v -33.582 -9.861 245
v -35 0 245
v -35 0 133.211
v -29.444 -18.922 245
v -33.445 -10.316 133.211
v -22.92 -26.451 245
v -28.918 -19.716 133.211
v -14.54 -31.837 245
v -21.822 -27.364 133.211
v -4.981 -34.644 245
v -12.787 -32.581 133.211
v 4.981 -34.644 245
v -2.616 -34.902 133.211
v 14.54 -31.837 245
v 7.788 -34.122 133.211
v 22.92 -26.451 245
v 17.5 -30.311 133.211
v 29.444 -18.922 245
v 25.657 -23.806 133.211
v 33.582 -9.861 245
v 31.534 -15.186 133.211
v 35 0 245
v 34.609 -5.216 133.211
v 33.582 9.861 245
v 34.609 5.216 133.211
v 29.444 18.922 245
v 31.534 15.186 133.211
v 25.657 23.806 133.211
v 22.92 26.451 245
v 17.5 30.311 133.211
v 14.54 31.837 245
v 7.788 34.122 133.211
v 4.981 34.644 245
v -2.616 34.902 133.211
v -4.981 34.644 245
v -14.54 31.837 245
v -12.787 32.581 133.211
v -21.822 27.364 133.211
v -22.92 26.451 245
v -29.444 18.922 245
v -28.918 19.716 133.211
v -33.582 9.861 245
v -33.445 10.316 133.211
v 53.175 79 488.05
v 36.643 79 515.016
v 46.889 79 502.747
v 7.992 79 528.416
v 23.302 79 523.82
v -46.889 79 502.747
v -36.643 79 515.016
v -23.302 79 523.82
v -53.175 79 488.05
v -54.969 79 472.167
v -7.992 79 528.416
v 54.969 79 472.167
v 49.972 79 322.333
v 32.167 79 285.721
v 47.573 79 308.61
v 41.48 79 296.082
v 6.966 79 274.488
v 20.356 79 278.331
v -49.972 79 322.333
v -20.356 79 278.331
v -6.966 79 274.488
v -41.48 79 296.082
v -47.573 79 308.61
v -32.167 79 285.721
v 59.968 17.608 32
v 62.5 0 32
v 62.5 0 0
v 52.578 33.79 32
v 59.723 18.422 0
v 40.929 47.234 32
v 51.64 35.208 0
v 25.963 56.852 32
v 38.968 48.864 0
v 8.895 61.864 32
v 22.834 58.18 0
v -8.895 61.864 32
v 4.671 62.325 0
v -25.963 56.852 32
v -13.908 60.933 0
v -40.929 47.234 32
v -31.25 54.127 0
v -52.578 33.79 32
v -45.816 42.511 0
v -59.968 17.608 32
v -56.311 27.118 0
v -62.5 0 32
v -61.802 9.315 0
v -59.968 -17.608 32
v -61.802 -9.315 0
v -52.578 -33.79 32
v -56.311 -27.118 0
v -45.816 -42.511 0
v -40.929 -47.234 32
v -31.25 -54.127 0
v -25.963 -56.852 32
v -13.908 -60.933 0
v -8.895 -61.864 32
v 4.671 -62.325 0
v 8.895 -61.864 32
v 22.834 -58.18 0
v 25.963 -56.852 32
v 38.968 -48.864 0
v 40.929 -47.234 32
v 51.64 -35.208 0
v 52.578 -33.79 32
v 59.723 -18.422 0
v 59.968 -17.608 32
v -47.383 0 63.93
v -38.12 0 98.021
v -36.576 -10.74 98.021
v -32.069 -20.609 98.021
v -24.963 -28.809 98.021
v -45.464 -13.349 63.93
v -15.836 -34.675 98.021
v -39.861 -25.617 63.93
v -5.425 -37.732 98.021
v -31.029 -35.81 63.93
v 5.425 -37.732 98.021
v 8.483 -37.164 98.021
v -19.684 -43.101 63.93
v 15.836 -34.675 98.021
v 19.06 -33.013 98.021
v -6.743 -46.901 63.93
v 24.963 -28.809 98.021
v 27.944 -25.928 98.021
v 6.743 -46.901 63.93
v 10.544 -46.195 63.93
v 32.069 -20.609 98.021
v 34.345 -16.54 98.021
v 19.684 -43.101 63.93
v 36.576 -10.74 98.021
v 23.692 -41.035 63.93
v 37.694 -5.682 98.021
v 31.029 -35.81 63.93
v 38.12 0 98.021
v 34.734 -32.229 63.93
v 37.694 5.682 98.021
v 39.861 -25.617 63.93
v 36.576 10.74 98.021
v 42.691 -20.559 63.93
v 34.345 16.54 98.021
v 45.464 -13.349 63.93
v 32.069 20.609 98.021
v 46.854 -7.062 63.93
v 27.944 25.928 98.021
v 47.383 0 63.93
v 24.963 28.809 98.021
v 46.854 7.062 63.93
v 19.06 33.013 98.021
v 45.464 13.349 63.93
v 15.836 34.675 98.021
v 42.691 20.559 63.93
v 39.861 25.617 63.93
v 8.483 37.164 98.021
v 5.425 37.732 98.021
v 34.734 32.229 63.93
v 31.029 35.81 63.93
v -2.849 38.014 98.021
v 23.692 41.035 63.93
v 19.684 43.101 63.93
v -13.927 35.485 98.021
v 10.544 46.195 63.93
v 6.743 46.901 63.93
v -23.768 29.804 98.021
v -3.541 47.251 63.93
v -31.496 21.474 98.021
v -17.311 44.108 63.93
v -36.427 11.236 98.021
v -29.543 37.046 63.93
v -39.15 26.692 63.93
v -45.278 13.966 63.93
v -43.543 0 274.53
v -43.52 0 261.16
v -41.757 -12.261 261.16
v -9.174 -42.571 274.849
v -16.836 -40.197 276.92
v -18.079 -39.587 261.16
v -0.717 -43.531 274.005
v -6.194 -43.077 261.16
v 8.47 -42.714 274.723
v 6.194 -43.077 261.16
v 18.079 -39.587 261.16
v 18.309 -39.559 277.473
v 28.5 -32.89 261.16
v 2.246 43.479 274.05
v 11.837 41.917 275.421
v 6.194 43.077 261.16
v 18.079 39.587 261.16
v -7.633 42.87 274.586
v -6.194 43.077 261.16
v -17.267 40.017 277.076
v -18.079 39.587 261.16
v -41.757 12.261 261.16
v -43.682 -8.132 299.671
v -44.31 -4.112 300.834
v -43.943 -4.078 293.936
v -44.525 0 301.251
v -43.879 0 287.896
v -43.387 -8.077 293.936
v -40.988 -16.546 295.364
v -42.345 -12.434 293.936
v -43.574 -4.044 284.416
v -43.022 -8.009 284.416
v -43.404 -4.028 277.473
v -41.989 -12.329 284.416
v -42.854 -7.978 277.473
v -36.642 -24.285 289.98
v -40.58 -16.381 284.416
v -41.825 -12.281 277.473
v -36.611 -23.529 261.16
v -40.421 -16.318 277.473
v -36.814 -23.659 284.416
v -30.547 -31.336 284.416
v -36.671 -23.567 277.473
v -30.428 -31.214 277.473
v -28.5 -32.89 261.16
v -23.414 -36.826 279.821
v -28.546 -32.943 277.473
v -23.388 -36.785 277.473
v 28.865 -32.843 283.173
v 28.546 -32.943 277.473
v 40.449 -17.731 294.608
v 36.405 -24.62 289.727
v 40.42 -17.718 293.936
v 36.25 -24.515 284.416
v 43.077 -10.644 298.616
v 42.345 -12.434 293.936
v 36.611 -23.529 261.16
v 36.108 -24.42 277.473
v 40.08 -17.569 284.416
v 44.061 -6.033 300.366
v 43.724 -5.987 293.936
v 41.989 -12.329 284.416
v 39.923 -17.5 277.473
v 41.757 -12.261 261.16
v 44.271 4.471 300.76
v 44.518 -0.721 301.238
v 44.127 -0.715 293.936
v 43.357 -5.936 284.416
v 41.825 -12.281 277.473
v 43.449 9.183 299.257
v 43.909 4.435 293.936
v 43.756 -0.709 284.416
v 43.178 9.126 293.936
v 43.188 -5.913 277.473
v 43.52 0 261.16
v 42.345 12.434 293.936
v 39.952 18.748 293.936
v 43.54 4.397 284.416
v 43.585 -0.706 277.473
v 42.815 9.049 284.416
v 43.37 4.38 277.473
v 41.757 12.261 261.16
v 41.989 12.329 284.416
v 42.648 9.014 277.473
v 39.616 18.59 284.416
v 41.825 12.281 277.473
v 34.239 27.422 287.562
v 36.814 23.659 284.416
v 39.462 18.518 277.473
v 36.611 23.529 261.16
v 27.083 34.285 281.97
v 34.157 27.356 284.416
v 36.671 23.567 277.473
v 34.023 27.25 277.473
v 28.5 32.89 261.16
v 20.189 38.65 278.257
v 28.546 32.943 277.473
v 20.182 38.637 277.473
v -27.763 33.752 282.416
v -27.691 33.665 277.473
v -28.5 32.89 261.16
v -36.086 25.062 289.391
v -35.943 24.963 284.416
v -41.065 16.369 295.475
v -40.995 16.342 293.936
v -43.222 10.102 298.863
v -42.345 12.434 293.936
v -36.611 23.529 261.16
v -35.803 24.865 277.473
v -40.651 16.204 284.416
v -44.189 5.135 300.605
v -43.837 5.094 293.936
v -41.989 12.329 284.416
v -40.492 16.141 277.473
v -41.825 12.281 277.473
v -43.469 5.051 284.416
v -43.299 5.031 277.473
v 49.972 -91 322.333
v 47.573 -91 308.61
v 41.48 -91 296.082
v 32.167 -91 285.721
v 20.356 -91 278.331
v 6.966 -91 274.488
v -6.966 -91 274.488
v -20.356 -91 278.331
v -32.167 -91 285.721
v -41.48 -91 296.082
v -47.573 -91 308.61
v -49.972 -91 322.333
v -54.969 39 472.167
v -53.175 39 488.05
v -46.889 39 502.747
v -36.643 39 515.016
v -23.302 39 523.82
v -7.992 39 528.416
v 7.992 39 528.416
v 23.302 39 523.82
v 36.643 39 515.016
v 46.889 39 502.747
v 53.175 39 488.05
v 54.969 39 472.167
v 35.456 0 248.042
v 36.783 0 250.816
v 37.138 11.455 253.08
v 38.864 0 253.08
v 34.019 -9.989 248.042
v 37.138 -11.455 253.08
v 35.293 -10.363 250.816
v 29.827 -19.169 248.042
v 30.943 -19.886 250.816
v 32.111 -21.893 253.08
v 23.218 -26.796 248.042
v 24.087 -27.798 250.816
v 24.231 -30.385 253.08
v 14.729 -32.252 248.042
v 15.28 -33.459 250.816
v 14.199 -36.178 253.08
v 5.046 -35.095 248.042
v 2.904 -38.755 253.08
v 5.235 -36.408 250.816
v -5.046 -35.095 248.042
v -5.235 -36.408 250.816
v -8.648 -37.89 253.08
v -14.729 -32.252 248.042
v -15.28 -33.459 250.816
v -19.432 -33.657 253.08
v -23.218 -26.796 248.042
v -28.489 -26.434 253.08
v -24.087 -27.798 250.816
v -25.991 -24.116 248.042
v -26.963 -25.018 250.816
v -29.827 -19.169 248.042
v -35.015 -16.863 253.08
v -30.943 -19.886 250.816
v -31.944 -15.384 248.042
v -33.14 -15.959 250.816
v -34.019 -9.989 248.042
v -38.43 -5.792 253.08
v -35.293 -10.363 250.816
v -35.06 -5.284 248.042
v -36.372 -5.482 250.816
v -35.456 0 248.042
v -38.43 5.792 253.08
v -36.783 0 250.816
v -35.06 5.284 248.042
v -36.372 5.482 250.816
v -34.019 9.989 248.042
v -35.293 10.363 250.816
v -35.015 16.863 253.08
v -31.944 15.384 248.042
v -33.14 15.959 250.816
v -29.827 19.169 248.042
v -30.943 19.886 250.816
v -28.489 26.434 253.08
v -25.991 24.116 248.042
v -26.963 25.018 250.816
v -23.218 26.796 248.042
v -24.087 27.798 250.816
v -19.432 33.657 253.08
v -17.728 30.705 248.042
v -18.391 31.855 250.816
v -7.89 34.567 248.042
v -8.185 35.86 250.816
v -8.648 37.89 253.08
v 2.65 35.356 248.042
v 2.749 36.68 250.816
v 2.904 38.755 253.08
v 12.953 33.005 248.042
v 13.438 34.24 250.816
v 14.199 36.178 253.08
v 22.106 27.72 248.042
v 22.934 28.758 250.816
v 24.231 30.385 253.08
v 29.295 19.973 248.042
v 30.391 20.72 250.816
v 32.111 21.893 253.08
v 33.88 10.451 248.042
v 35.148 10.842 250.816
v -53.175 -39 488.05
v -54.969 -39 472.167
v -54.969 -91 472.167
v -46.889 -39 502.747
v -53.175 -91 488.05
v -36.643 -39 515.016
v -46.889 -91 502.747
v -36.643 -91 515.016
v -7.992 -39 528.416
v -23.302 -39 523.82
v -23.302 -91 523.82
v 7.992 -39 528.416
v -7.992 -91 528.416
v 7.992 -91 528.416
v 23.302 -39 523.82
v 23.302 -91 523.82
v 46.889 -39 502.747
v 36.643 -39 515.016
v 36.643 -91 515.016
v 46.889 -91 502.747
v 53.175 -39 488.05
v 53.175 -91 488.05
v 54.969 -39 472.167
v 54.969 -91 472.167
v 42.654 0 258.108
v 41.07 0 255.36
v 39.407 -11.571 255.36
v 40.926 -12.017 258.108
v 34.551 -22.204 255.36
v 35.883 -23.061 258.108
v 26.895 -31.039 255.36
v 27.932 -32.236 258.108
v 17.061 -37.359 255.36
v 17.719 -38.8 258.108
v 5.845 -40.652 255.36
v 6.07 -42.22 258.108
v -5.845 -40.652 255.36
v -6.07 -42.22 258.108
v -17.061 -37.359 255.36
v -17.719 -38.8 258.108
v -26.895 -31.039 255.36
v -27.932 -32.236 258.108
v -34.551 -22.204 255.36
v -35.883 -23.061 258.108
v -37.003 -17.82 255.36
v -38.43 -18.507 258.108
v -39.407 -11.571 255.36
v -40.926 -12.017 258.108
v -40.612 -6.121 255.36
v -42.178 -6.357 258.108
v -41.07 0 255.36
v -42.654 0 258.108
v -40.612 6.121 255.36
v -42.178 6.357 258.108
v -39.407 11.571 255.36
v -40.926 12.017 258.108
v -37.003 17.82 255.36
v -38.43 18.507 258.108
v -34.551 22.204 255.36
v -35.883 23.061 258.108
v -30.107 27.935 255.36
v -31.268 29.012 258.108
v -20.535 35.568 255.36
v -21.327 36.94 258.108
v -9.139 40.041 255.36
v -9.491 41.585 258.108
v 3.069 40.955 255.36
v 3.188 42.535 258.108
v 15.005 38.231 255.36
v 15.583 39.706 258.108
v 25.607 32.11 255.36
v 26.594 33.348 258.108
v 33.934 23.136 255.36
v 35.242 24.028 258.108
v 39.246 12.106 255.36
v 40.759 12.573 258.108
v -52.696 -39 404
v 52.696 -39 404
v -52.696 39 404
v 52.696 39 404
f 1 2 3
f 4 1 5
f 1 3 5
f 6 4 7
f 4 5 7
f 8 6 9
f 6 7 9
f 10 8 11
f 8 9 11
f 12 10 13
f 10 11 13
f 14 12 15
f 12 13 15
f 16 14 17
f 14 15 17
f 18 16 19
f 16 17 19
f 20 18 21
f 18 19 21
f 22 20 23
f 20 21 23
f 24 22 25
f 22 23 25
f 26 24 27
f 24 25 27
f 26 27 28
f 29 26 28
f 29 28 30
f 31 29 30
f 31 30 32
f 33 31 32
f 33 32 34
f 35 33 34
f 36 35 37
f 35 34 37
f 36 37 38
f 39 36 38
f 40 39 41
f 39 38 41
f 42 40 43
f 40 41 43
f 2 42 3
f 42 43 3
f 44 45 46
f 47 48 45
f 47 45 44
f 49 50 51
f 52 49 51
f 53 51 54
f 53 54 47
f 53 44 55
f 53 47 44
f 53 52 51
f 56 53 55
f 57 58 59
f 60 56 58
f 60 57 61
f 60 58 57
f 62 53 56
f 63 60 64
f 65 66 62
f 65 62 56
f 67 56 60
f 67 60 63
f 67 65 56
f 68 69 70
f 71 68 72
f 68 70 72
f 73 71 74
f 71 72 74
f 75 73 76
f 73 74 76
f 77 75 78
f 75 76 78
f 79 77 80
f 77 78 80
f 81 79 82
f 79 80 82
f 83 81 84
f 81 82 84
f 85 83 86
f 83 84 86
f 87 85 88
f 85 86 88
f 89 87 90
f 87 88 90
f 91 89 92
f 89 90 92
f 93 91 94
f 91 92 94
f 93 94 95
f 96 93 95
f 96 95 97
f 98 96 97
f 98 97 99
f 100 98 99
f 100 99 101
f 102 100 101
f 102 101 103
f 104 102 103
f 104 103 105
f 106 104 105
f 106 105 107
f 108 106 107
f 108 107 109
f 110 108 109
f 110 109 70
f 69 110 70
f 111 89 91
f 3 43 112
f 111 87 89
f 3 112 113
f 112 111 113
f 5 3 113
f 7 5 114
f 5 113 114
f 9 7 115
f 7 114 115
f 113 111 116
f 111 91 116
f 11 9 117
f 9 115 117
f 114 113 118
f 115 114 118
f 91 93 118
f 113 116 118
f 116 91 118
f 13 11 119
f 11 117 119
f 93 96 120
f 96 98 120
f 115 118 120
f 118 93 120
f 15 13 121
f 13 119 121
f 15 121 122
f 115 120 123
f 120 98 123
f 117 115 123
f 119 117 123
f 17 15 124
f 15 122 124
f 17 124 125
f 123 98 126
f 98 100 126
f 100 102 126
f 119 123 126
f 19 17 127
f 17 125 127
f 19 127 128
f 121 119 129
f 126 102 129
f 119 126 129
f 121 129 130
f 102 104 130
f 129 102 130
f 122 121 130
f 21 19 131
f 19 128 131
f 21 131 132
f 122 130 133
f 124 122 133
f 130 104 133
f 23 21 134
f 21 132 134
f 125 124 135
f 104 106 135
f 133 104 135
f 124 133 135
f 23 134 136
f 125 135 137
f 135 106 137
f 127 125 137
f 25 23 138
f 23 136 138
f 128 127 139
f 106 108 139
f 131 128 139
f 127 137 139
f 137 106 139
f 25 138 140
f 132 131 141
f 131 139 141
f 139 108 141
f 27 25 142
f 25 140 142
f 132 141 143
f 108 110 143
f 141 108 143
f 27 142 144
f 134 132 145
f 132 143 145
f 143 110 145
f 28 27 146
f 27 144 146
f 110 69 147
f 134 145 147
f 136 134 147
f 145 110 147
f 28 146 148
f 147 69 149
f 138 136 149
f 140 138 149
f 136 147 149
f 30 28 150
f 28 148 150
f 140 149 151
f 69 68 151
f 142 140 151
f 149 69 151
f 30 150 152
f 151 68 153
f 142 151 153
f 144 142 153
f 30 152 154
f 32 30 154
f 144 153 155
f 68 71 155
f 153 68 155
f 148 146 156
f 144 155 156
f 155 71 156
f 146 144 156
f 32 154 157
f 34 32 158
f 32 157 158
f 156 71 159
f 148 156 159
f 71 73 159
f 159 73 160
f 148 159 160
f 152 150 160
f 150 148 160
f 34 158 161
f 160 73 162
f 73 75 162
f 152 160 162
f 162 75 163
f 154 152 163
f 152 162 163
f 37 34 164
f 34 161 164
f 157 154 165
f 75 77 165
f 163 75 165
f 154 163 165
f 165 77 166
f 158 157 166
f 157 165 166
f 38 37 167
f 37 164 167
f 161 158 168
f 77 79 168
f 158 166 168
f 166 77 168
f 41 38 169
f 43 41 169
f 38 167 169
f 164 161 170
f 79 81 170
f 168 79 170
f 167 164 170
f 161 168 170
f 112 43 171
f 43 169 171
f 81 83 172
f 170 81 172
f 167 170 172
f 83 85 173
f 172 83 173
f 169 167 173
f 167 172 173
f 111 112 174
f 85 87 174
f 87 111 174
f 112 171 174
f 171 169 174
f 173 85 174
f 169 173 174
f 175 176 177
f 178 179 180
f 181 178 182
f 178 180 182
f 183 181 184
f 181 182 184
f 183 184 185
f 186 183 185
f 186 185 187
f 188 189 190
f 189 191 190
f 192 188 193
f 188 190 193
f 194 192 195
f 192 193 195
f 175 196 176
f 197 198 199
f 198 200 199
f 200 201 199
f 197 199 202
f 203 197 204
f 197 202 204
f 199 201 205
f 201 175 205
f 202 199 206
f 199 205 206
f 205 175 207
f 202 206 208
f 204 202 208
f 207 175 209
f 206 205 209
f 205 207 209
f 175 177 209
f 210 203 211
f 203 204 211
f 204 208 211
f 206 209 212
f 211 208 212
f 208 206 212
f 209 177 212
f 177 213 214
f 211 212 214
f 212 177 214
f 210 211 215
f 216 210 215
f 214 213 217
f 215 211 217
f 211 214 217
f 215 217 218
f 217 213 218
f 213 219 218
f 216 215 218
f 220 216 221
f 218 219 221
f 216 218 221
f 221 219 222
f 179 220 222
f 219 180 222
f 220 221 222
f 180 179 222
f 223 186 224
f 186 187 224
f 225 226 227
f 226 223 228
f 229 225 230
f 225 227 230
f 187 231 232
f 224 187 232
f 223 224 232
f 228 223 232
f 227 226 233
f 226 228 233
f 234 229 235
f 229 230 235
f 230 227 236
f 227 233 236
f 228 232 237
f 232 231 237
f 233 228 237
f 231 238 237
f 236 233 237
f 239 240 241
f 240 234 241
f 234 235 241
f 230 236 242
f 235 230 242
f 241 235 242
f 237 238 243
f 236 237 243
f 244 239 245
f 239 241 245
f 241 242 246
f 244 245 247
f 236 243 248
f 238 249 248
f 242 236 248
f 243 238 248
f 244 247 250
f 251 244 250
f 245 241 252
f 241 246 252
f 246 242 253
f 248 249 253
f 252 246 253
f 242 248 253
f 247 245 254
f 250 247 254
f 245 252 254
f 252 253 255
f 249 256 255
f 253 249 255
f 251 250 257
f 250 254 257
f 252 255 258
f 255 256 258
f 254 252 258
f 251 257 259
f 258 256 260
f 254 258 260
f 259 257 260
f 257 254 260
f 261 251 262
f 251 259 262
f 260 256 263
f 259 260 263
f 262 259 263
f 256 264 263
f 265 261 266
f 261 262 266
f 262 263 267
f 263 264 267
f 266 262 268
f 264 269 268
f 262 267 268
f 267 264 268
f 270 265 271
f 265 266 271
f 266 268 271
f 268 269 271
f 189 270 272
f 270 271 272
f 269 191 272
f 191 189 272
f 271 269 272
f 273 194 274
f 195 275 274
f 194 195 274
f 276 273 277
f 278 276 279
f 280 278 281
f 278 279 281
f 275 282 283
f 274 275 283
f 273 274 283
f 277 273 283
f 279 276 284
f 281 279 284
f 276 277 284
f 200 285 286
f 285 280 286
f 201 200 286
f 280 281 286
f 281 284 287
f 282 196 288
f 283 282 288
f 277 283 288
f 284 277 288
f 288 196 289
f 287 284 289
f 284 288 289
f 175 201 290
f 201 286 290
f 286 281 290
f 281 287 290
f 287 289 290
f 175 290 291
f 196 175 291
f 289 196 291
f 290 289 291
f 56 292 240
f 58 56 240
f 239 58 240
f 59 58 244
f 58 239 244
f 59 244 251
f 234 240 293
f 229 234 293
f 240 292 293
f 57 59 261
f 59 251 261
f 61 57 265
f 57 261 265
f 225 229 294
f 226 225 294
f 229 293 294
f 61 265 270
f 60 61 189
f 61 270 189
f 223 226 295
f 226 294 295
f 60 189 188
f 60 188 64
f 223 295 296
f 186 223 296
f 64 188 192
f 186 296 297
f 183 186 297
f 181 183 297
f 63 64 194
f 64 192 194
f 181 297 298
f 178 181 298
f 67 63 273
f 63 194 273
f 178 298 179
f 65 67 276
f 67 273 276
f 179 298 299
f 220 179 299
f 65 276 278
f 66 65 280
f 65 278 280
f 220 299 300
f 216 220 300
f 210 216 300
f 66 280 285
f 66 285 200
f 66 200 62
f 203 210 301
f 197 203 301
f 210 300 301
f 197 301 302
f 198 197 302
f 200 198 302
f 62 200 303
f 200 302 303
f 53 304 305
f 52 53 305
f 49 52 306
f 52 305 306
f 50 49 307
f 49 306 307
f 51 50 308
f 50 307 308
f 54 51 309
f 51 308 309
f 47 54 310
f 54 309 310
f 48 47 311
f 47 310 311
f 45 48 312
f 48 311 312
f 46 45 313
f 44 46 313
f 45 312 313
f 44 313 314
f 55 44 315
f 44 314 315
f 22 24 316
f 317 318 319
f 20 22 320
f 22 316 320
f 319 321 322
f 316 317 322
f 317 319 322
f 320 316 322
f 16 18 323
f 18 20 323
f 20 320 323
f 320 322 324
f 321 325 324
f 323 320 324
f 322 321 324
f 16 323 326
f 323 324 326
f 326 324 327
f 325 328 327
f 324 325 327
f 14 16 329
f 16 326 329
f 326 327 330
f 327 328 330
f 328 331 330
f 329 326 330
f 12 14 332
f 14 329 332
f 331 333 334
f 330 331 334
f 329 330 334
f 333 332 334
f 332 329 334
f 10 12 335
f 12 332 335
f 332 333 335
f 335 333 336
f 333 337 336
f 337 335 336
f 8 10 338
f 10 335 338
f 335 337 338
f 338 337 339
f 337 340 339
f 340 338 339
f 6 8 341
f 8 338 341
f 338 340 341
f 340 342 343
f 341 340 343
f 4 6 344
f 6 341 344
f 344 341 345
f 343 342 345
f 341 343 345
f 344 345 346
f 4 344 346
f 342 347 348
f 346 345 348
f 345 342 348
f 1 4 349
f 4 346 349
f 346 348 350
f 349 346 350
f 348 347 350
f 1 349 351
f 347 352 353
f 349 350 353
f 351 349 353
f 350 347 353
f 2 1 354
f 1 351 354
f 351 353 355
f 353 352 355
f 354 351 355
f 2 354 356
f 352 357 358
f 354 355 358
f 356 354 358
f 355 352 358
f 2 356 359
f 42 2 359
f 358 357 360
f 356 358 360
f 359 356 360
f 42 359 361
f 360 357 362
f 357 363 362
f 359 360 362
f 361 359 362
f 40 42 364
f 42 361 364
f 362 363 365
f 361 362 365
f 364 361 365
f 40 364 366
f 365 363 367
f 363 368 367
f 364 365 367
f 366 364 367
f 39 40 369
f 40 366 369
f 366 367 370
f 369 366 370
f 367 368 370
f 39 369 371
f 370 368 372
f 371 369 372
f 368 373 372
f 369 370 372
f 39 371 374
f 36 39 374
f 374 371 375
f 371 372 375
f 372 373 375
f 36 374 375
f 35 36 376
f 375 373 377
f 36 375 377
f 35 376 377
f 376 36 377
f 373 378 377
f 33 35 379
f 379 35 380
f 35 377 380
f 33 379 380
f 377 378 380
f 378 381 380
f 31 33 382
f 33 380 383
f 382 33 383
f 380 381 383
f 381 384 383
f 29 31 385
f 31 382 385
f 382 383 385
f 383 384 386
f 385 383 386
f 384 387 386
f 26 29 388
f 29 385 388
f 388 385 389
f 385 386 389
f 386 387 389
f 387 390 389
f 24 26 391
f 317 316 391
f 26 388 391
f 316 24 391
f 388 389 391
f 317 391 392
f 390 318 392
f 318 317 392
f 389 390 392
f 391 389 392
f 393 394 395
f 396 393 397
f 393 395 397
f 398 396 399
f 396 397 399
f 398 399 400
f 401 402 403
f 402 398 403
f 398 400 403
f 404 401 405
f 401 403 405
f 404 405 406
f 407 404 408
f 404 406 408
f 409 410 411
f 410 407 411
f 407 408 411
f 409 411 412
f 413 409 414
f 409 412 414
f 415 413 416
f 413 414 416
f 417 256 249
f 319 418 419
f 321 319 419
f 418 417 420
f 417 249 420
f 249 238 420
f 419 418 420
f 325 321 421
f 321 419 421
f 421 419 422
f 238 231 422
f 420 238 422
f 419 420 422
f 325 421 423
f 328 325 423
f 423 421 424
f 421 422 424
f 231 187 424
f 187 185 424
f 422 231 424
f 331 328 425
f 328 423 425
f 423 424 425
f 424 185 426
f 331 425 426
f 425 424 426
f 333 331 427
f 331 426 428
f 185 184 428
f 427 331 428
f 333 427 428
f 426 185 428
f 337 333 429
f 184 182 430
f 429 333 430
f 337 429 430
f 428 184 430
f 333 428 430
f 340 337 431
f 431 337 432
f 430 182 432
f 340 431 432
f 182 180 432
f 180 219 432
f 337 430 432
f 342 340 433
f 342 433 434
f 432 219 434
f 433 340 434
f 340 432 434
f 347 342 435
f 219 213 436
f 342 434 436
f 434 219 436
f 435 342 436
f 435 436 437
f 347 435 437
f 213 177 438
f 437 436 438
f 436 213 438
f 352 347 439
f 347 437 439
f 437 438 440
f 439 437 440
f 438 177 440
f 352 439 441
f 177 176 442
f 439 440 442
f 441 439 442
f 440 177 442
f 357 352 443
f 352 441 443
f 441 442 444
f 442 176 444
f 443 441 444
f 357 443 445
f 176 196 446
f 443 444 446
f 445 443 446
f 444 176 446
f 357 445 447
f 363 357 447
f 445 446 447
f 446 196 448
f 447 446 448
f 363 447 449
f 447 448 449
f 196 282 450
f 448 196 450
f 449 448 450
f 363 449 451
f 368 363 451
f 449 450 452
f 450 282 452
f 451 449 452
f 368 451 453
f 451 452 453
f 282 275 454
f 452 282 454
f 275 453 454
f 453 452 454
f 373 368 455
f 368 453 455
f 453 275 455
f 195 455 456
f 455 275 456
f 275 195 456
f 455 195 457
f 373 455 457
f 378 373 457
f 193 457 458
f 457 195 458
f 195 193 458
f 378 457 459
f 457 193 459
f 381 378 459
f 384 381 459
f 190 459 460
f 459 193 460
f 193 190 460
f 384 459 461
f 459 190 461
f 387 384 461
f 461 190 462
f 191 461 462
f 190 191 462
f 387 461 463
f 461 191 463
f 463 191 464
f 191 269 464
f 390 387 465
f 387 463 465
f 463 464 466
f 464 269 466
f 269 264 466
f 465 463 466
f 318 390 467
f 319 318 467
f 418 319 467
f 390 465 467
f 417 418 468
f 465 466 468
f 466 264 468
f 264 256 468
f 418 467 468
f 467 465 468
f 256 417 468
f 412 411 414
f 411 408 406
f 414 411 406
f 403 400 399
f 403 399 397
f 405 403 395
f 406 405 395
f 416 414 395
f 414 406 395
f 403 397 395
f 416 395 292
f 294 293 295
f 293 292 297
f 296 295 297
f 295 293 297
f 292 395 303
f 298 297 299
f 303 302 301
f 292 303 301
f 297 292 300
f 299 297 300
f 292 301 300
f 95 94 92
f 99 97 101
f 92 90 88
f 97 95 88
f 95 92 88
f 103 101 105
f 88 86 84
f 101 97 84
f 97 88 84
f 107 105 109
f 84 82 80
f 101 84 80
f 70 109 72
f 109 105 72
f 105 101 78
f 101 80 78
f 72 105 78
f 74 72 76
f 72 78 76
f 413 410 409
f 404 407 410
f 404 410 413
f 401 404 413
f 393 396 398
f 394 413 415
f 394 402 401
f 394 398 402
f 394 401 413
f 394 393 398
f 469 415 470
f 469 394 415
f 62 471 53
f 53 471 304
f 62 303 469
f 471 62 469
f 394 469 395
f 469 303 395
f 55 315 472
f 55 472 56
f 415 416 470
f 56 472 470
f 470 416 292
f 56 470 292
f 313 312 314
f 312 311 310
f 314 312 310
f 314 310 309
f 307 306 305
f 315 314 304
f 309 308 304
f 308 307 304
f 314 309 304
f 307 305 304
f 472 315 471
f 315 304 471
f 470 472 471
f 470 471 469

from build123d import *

# Parameters (mm, degrees)
SKETCH_1_R               = 62.5
EXTRUDE_1_DEPTH          = 32
EXTRUDE_2_DEPTH          = 79
EXTRUDE_2_DEPTH_BACK     = 91
CUT_EXTRUDE_1_DEPTH      = 541.396382314
CUT_EXTRUDE_1_DEPTH_BACK = 541.396382314
SKETCH_12_W              = 78
SKETCH_12_H              = 125


with BuildPart() as part:
    # 草圖1 → 填料-伸長1 (new body)
    with BuildSketch(Plane.XY):
        Circle(SKETCH_1_R)
    extrude(amount=EXTRUDE_1_DEPTH)

    # 草圖3 → 旋轉1 (revolve)
    with BuildSketch(Plane(origin=(0, 0, 0), x_dir=(1, 0, 0), z_dir=(0, 1, 0)), mode=Mode.PRIVATE) as revolve_1_sk:
        with BuildLine():
            Line((0, -32), (0, -245))
            Line((0, -245), (35, -245))
            Line((35, -245), (35, -133.211))
            ThreePointArc((35, -133.211), (41.997410306, -80.770756577), (62.5, -32))
            Line((62.5, -32), (0, -32))
        make_face()
    revolve(revolve_1_sk.sketch.rotate(Axis((0, 0, 32), (0, 0, 1)), 180), axis=Axis((0, 0, 32), (0, 0, 1)))

    # 草圖6 → 旋轉2 (revolve)
    with BuildSketch(Plane(origin=(0, 0, 0), x_dir=(1, 0, 0), z_dir=(0, 1, 0))):
        with BuildLine():
            Line((0, -245), (35, -245))
            ThreePointArc((35, -245), (36.015734709, -249.478225638), (38.864145372, -253.08))
            ThreePointArc((38.864145372, -253.08), (41.946904934, -256.68505084), (43.52, -261.16))
            Line((43.52, -261.16), (0, -261.16))
            Line((0, -261.16), (0, -245))
        make_face()
    revolve(axis=Axis((0, 0, 211.16), (0, 0, -1)))

    # 草圖9 → 旋轉3 (revolve)
    with BuildSketch(Plane(origin=(0, 0, 0), x_dir=(1, 0, 0), z_dir=(0, 1, 0)), mode=Mode.PRIVATE) as revolve_3_sk:
        with BuildLine():
            Line((0, -261.16), (0, -322.34))
            Line((0, -322.34), (46.183269827, -322.34))
            ThreePointArc((46.183269827, -322.34), (44.034639015, -291.785565226), (43.52, -261.16))
            Line((43.52, -261.16), (0, -261.16))
        make_face()
    revolve(revolve_3_sk.sketch.rotate(Axis((0, 0, 0), (0, 0, 1)), 180), axis=Axis((0, 0, 0), (0, 0, 1)))

    # 草圖10 → 填料-伸長2 (add, two sides: drawn at the far end of the back side and taken through both)
    with BuildSketch(Plane(origin=(0, 0, 0), x_dir=(0, 0, -1), z_dir=(0, 1, 0)).offset(-EXTRUDE_2_DEPTH_BACK)):
        with BuildLine():
            Line((-322.333333333, 49.972214502), (-472.166666667, 54.969435952))
            ThreePointArc((-472.166666667, 54.969435952), (-529, 0), (-472.166666667, -54.969435952))
            Line((-472.166666667, -54.969435952), (-322.333333333, -49.972214502))
            ThreePointArc((-322.333333333, -49.972214502), (-274, 0), (-322.333333333, 49.972214502))
        make_face()
    extrude(amount=EXTRUDE_2_DEPTH + EXTRUDE_2_DEPTH_BACK)

    # 草圖12 → 除料-伸長1 (cut, two sides: drawn at the far end of the back side and taken through both)
    with BuildSketch(Plane(origin=(0, 0, 0), x_dir=(0, -1, 0), z_dir=(1, 0, 0)).offset(-CUT_EXTRUDE_1_DEPTH_BACK)):
        with Locations((0, -466.5)):
            Rectangle(SKETCH_12_W, SKETCH_12_H)
    extrude(amount=CUT_EXTRUDE_1_DEPTH + CUT_EXTRUDE_1_DEPTH_BACK, mode=Mode.SUBTRACT)


solid = part.part
